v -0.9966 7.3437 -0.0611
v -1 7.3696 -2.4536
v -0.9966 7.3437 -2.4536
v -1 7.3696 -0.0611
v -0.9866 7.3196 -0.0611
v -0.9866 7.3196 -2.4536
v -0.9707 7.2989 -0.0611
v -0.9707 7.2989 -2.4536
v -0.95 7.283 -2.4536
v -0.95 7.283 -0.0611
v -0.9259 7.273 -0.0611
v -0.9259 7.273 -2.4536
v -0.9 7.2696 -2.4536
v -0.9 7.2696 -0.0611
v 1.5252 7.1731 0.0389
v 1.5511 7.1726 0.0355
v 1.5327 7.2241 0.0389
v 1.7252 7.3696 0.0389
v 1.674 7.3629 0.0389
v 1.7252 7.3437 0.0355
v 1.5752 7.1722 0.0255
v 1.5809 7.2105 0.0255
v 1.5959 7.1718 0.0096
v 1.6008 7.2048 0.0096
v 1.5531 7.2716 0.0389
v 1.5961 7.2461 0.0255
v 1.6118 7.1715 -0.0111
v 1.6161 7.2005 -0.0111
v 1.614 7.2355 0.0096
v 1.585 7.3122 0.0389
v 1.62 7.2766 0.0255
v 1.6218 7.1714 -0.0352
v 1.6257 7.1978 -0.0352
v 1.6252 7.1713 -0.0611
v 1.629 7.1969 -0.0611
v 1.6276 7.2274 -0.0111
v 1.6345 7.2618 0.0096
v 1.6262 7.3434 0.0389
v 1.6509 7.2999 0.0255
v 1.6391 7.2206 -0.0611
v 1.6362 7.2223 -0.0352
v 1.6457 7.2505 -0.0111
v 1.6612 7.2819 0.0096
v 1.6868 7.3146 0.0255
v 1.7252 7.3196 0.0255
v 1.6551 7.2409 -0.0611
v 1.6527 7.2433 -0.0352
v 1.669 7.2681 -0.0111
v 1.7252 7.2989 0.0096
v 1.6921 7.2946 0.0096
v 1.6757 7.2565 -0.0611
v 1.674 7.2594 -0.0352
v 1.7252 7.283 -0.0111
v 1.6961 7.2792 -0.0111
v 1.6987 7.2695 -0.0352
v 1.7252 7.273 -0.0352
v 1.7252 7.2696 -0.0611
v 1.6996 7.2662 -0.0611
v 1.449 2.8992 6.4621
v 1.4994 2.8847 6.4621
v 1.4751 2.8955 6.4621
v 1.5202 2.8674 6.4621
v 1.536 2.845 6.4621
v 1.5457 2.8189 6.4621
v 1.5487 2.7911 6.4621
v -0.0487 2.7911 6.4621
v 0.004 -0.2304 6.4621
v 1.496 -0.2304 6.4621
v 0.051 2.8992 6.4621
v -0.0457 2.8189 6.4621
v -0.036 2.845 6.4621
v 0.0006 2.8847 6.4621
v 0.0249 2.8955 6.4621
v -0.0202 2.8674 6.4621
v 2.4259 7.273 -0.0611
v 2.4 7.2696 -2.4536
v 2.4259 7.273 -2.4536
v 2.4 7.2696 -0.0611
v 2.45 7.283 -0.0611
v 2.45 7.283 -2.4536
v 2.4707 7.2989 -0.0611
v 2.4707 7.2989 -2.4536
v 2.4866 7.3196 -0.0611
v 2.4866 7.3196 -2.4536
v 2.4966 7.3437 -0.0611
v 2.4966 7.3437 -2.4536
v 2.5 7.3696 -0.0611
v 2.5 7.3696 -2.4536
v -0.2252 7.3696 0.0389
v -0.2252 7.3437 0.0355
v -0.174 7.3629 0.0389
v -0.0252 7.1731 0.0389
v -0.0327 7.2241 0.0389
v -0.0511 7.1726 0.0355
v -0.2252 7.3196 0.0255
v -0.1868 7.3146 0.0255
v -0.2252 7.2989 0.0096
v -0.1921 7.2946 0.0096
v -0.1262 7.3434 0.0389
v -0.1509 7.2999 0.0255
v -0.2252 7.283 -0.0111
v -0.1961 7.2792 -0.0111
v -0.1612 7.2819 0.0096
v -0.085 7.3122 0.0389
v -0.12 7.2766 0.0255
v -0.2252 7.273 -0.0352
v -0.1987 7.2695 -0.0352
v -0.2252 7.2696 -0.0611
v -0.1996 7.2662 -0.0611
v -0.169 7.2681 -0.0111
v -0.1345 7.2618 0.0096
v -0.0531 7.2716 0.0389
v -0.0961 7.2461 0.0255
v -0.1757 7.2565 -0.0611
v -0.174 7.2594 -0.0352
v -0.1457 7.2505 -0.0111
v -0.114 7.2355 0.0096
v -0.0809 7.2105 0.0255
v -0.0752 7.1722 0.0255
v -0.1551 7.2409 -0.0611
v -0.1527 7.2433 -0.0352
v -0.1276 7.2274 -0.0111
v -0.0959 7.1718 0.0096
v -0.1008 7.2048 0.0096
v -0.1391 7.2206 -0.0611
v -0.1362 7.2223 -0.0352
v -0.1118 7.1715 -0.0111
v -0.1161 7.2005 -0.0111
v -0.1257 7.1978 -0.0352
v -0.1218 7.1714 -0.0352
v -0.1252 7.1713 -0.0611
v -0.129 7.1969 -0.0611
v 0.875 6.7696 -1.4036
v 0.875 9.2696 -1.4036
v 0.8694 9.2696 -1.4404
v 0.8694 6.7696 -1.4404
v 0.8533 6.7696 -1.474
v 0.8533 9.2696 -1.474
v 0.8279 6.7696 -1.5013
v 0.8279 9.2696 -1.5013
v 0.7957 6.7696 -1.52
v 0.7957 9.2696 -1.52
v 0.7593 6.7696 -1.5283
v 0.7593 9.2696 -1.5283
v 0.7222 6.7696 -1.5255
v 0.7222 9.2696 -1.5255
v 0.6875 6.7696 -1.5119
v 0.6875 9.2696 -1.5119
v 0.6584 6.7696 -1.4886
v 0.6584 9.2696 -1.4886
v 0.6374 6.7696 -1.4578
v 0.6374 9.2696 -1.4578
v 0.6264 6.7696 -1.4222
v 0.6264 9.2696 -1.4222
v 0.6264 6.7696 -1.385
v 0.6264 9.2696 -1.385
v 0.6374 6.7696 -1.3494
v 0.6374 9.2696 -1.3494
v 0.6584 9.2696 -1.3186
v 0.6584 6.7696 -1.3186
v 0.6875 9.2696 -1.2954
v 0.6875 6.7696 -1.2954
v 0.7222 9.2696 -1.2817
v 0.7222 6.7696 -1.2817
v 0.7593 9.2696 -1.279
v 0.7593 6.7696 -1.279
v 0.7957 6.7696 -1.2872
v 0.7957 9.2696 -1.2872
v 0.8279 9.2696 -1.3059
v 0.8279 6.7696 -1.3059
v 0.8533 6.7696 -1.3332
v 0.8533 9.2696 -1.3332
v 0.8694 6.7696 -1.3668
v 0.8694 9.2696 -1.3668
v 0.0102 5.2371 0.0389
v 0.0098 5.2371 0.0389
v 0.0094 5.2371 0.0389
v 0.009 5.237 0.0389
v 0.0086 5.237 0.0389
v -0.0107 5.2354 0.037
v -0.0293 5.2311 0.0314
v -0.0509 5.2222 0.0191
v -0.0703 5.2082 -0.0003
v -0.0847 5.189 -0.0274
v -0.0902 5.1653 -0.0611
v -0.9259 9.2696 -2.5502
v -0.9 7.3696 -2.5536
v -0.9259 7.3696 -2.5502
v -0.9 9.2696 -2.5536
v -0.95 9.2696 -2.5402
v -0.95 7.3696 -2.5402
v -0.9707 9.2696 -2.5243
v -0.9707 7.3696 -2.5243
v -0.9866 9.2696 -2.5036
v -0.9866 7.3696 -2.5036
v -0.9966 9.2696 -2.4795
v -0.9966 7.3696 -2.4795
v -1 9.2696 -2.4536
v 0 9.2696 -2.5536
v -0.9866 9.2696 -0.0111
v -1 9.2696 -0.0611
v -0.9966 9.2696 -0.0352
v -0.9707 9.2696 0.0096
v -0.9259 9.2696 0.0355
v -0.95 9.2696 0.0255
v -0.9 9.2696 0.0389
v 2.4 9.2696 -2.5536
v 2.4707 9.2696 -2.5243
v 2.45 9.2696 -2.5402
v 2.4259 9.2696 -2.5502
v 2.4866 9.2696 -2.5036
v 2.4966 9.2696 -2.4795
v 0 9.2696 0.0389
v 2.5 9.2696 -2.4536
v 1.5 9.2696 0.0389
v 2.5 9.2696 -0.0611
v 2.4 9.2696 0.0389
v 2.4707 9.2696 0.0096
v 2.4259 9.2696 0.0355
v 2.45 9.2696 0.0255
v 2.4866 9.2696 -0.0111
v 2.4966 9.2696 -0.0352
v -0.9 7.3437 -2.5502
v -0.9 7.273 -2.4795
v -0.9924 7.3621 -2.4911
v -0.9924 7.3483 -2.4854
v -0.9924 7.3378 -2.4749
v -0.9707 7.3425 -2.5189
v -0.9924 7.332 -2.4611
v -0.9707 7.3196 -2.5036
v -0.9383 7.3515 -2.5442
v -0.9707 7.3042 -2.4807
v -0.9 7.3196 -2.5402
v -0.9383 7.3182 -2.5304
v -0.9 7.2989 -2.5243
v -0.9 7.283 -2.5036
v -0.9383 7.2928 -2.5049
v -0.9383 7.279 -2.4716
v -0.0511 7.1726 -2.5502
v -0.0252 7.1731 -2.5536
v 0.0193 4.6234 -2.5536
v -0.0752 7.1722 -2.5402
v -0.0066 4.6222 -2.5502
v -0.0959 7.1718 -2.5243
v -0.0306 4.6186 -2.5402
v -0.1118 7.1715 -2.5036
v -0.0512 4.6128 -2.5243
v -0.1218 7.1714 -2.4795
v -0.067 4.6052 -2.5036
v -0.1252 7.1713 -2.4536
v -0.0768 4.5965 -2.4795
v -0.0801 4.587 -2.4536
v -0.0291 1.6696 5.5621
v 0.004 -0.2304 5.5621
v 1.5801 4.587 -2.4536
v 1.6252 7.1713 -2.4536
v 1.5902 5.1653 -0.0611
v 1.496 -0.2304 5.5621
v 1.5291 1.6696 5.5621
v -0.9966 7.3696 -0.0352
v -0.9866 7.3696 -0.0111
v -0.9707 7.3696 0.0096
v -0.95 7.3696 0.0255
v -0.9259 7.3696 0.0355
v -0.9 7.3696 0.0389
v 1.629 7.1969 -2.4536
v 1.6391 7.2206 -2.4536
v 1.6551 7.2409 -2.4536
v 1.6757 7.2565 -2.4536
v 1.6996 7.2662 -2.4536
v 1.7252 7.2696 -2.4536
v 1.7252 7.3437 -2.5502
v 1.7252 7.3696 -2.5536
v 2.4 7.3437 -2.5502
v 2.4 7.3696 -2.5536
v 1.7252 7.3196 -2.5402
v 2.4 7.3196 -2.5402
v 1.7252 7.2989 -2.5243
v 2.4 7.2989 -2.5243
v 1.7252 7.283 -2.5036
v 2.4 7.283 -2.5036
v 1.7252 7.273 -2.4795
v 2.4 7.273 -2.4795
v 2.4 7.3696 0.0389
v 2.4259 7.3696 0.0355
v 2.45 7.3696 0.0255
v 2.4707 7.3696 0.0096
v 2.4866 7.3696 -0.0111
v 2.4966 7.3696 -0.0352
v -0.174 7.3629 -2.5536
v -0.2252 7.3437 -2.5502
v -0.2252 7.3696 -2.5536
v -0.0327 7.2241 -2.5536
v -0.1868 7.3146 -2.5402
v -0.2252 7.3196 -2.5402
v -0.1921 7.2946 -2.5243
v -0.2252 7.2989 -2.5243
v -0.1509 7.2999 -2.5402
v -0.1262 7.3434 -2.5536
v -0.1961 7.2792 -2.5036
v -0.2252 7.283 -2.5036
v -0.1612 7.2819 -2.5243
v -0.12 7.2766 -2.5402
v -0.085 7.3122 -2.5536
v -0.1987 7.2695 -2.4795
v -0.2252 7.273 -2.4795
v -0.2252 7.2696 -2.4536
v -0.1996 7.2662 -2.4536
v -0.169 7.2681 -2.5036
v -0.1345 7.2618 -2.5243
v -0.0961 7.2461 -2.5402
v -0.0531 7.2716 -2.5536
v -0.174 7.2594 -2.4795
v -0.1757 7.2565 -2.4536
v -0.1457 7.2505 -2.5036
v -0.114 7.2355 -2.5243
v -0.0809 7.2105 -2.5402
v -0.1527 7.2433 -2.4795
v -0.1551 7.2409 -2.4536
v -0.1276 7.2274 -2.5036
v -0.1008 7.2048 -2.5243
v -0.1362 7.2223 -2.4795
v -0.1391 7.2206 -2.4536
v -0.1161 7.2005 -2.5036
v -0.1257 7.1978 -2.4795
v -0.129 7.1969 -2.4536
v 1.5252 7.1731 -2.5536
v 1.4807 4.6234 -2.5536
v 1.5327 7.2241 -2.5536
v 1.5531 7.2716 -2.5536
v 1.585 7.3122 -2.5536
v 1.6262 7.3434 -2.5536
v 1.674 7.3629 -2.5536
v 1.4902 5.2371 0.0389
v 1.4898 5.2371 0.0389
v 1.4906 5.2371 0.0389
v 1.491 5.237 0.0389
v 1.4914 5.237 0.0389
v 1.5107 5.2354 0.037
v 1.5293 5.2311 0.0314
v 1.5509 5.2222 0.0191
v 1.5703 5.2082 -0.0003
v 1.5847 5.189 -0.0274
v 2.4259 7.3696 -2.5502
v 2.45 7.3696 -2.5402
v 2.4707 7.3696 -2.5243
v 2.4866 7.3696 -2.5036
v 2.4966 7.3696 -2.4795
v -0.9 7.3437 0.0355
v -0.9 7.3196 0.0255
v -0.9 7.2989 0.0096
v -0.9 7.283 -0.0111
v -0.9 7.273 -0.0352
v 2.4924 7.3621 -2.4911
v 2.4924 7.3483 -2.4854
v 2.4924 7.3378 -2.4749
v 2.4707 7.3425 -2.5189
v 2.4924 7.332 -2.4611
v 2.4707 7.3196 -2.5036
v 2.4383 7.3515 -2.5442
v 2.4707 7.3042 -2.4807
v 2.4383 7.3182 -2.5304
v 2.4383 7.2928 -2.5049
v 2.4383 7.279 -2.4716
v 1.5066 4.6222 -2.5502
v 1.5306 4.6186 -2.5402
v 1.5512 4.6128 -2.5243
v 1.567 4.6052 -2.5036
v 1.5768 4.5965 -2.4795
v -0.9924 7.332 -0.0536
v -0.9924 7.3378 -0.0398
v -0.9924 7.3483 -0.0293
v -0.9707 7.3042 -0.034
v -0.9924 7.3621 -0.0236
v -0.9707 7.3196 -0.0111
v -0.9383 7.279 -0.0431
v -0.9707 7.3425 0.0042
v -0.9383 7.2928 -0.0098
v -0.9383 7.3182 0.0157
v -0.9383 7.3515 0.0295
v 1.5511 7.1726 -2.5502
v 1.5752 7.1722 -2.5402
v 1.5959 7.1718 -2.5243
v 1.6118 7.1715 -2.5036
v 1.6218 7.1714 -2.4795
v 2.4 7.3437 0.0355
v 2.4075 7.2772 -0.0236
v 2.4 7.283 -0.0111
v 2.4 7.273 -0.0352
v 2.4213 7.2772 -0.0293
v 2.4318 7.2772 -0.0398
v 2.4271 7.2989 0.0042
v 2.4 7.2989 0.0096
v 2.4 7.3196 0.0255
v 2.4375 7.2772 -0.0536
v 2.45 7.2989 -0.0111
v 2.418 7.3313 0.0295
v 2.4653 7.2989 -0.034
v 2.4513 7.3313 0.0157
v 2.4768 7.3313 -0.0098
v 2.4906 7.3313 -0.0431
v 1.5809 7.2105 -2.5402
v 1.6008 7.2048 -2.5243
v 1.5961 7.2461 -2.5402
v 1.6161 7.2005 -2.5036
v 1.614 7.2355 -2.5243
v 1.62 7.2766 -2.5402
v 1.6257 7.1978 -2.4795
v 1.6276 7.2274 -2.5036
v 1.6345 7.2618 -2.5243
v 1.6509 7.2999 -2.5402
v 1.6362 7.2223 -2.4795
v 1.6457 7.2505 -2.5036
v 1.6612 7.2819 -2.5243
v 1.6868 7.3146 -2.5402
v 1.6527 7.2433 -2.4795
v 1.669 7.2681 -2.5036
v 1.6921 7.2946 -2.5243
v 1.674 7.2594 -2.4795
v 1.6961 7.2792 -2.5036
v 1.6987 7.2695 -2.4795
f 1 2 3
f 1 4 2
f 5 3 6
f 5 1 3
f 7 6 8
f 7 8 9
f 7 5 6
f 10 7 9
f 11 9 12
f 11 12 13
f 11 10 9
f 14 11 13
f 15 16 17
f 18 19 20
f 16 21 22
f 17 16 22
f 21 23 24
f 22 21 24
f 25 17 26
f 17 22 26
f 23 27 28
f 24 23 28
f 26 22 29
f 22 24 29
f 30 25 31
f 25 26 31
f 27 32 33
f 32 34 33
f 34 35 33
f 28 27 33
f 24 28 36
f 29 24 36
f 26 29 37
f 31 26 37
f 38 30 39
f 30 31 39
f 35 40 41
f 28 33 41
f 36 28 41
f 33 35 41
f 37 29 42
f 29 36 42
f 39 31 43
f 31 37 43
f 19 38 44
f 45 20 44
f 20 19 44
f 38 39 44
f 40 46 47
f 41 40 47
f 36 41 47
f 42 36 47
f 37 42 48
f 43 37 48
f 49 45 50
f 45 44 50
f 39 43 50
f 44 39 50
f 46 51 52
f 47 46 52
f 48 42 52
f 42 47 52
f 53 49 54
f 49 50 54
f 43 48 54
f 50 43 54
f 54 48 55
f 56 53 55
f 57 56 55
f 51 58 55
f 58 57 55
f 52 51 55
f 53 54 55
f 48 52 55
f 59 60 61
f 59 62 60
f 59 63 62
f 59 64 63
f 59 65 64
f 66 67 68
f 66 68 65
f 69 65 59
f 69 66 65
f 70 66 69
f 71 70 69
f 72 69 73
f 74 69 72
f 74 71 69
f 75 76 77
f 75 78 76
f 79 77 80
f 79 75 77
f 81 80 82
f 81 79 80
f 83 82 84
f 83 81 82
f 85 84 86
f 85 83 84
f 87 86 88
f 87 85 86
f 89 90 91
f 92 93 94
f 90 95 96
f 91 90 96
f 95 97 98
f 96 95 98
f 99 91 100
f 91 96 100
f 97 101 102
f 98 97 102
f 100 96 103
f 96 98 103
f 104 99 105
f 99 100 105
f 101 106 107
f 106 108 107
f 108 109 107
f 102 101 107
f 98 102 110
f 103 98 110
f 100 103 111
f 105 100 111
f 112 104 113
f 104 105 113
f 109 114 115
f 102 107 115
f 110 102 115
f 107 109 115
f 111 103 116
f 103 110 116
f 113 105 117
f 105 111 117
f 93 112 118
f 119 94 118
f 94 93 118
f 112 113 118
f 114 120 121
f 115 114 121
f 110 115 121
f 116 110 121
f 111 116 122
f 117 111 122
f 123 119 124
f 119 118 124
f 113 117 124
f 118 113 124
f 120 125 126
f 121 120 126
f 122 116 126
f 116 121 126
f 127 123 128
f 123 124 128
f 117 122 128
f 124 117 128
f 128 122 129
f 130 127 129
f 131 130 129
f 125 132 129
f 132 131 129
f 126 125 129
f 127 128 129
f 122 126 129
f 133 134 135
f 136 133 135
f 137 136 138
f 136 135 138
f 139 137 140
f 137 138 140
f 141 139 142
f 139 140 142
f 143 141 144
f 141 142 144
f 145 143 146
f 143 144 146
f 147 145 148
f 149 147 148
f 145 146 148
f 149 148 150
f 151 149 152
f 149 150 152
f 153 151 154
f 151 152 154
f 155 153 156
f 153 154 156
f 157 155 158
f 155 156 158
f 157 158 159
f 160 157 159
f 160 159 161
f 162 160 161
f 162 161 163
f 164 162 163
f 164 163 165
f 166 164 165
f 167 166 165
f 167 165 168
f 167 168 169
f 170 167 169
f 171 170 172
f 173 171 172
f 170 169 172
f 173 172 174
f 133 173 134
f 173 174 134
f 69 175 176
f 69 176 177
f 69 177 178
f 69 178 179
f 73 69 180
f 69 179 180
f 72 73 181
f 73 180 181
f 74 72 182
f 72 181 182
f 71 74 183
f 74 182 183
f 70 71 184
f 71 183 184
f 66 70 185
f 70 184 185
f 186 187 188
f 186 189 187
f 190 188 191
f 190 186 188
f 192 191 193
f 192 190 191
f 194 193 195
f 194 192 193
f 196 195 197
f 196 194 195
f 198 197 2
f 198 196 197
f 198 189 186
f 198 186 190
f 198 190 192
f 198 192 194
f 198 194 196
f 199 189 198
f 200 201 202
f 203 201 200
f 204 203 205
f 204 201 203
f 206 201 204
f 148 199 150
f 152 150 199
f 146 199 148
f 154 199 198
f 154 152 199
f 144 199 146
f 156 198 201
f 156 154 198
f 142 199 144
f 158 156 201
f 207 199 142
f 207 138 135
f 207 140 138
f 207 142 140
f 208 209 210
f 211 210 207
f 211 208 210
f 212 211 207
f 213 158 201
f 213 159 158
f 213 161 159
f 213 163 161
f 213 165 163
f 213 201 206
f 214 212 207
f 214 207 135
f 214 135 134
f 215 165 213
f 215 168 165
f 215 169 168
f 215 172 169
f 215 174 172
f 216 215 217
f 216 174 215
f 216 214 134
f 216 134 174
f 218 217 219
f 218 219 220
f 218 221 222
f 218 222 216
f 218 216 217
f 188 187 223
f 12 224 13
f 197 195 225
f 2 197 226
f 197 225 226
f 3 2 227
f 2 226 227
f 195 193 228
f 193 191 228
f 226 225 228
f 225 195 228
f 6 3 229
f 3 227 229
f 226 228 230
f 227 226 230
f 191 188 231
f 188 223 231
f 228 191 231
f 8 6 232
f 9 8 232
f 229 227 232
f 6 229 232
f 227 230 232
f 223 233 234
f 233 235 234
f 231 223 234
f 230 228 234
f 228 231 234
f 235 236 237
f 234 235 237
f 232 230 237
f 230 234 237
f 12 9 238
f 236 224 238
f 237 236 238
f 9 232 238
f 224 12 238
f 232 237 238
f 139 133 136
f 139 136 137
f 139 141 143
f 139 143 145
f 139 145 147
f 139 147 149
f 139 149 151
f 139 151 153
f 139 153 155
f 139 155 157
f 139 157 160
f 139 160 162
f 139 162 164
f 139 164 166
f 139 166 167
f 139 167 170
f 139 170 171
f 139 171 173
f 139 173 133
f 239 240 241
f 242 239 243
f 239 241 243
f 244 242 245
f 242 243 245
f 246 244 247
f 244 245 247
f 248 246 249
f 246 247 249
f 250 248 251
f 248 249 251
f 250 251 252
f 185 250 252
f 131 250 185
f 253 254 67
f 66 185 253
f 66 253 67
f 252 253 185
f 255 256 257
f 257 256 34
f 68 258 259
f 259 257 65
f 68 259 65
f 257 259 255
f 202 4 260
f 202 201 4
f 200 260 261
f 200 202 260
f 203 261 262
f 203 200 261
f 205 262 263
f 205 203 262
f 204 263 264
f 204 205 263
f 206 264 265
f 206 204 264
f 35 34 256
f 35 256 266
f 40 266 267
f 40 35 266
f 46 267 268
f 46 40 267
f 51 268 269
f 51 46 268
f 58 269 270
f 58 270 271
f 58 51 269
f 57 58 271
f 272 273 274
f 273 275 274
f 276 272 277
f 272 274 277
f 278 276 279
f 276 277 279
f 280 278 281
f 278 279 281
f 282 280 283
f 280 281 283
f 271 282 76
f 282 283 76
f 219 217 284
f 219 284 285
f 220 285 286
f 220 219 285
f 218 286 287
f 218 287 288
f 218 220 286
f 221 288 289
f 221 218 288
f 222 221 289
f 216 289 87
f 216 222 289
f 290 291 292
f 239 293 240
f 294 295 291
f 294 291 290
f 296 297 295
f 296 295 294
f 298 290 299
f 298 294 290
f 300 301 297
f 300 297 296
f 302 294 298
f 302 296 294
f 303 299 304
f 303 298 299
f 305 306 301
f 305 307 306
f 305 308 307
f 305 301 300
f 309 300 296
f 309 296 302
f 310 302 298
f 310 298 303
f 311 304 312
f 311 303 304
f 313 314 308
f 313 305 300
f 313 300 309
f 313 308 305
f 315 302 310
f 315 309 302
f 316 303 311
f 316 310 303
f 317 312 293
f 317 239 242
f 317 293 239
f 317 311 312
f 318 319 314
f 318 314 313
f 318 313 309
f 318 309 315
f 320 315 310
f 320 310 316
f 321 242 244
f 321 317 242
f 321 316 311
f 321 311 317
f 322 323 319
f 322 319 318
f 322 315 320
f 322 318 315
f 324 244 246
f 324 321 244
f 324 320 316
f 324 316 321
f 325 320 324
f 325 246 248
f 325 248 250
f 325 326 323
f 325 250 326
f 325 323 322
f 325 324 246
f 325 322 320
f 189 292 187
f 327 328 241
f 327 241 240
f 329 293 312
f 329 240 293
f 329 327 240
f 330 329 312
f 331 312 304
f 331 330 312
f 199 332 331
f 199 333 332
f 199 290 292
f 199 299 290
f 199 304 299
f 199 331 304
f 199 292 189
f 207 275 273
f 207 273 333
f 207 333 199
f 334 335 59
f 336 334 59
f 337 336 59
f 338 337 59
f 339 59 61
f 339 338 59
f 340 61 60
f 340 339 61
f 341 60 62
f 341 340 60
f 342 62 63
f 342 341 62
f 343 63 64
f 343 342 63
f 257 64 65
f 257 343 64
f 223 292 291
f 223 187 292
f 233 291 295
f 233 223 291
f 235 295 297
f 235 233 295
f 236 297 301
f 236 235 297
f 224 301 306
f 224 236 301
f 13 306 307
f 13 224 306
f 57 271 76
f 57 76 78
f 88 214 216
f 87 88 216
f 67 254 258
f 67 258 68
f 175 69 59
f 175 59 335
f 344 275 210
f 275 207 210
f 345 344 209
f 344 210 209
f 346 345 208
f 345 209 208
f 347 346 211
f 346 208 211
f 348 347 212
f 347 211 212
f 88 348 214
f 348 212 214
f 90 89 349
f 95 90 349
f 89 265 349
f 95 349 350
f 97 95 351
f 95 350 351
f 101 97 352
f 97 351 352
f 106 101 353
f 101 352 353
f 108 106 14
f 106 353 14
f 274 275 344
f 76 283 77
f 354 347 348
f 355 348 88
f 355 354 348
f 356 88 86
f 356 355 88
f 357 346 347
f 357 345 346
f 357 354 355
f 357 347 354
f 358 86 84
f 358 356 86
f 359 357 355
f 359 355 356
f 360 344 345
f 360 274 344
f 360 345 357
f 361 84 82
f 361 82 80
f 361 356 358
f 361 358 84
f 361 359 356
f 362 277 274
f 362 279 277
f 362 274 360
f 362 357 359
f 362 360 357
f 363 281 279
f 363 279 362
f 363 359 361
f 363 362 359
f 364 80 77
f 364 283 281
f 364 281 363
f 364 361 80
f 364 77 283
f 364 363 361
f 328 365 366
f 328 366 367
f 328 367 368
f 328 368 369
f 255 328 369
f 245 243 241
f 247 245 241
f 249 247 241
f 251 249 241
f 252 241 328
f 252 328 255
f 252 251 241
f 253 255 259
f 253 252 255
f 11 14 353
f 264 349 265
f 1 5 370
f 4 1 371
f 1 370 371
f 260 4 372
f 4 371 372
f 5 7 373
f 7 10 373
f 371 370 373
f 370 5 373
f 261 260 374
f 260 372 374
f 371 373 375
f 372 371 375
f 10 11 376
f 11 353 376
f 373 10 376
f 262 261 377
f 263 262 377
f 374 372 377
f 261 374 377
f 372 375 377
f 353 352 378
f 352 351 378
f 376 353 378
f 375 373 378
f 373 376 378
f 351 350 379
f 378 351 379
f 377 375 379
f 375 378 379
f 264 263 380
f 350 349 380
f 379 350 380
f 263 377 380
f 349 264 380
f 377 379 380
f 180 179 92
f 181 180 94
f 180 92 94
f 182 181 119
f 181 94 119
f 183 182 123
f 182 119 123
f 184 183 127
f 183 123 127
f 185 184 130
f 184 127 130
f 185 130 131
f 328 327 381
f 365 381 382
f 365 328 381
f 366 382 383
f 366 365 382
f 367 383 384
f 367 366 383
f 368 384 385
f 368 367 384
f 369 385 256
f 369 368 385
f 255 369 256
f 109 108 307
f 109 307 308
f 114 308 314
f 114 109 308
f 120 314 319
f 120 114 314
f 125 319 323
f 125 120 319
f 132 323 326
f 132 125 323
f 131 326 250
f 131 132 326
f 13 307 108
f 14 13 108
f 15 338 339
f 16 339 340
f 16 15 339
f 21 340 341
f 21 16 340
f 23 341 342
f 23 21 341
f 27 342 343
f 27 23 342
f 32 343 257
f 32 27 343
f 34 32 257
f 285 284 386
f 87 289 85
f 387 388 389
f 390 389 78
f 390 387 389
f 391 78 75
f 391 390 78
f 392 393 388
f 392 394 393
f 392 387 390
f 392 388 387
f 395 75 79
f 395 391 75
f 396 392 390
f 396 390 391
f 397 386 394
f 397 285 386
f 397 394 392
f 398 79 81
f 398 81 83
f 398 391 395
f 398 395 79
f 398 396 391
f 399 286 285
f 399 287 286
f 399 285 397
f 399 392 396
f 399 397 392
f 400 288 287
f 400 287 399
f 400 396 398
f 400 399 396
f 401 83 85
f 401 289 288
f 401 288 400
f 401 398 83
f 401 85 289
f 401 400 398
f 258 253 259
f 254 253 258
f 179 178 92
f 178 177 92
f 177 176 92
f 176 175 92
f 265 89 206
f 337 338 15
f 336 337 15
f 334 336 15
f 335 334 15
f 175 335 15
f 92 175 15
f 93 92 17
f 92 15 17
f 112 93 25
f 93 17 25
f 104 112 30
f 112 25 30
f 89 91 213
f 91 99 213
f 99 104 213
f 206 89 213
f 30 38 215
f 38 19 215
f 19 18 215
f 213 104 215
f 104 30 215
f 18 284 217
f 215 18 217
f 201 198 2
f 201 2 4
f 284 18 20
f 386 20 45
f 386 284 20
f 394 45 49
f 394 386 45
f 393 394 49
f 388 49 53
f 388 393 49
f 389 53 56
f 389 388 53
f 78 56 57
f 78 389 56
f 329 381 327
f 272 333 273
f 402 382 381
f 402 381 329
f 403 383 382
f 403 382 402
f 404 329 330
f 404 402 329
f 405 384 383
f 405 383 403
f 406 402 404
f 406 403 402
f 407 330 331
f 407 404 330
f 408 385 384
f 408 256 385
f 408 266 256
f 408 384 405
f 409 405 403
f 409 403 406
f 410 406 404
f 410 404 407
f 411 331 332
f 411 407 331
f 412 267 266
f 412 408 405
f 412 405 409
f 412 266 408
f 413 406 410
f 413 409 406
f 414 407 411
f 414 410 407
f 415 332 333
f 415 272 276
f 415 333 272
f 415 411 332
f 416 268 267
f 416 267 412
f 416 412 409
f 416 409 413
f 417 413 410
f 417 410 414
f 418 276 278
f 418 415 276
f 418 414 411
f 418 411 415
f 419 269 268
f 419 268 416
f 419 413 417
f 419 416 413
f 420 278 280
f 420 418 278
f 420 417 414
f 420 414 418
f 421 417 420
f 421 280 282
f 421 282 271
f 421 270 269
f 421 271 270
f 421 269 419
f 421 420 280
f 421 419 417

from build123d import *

# Parameters (mm, degrees)
BOSS_EXTRUDE1_DEPTH      = 1.5
SKETCH5_W                = 2.592520813
SKETCH5_H                = 2
BOSS_EXTRUDE2_DEPTH      = 1
BOSS_EXTRUDE2_DEPTH_BACK = 2.5
DRAFT1_ANGLE             = -1
FILLET1_R                = 0.1
SKETCH6_R                = 0.125
CUT_EXTRUDE1_DEPTH       = 2.5


with BuildPart() as part:
    # Sketch1 → Boss-Extrude1 (new body)
    with BuildSketch(Plane(origin=(0, 0, 0), x_dir=(0, 0, -1), z_dir=(1, 0, 0))):
        Polygon((-5.56205373, 1.669569419), (-5.56205373, -0.230430581), (-6.46205373, -0.230430581), (-6.46205373, 2.899223958), (-0.03891584, 5.23705496), (-0.03891584, 9.269569419), (2.553604973, 9.269569419), (2.553604973, 4.623427618), align=None)
    extrude(amount=BOSS_EXTRUDE1_DEPTH)

    # Sketch5 → Boss-Extrude2 (add, two sides)
    with BuildSketch(Plane.ZY) as boss_extrude2_sk:
        with Locations((-1.257344567, 8.269569419)):
            Rectangle(SKETCH5_W, SKETCH5_H)
    extrude(amount=BOSS_EXTRUDE2_DEPTH)
    extrude(boss_extrude2_sk.sketch, amount=-BOSS_EXTRUDE2_DEPTH_BACK)

    # Draft1
    draft1_faces = [part.faces().sort_by_distance(p)[0] for p in [
        (1.5, 4.069973974, 1.641347483),
        (0, 4.069973974, 1.641347483),
    ]]
    draft(draft1_faces, Plane.ZX, DRAFT1_ANGLE)

    # Fillet1
    fillet1_edges = [part.edges().sort_by_distance(p)[0] for p in [
        (-0.10915197, 6.253312189, 0.03891584),
        (-0.071009638, 4.068139459, 3.250484785),
        (1.603796518, 5.946498518, -2.553604973),
        (-0.126890806, 7.269569419, -1.257344566),
        (-0.563445403, 7.269569419, -2.553604973),
        (-0.563445403, 7.269569419, 0.03891584),
        (2.063445403, 7.269569419, -2.553604973),
        (2.5, 8.269569419, -2.553604973),
        (2.5, 8.269569419, 0.03891584),
        (2.063445403, 7.269569419, 0.03891584),
        (1.626890806, 7.269569419, -1.257344566),
        (2.5, 7.269569419, -1.257344566),
        (-1, 8.269569419, -2.553604973),
        (-1, 7.269569419, -1.257344566),
        (-1, 8.269569419, 0.03891584),
        (1.571009638, 4.068139459, 3.250484785),
        (1.60915197, 6.253312189, 0.03891584),
        (-0.103796518, 5.946498518, -2.553604973),
    ]]
    fillet(fillet1_edges, radius=FILLET1_R)

    # Sketch6 → Cut-Extrude1 (cut)
    with BuildSketch(Plane(origin=(0, 9.269569419, 0), x_dir=(1, 0, 0), z_dir=(0, 1, 0))):
        with Locations((0.75, 1.403604973)):
            Circle(SKETCH6_R)
    extrude(amount=-CUT_EXTRUDE1_DEPTH, mode=Mode.SUBTRACT)


solid = part.part
